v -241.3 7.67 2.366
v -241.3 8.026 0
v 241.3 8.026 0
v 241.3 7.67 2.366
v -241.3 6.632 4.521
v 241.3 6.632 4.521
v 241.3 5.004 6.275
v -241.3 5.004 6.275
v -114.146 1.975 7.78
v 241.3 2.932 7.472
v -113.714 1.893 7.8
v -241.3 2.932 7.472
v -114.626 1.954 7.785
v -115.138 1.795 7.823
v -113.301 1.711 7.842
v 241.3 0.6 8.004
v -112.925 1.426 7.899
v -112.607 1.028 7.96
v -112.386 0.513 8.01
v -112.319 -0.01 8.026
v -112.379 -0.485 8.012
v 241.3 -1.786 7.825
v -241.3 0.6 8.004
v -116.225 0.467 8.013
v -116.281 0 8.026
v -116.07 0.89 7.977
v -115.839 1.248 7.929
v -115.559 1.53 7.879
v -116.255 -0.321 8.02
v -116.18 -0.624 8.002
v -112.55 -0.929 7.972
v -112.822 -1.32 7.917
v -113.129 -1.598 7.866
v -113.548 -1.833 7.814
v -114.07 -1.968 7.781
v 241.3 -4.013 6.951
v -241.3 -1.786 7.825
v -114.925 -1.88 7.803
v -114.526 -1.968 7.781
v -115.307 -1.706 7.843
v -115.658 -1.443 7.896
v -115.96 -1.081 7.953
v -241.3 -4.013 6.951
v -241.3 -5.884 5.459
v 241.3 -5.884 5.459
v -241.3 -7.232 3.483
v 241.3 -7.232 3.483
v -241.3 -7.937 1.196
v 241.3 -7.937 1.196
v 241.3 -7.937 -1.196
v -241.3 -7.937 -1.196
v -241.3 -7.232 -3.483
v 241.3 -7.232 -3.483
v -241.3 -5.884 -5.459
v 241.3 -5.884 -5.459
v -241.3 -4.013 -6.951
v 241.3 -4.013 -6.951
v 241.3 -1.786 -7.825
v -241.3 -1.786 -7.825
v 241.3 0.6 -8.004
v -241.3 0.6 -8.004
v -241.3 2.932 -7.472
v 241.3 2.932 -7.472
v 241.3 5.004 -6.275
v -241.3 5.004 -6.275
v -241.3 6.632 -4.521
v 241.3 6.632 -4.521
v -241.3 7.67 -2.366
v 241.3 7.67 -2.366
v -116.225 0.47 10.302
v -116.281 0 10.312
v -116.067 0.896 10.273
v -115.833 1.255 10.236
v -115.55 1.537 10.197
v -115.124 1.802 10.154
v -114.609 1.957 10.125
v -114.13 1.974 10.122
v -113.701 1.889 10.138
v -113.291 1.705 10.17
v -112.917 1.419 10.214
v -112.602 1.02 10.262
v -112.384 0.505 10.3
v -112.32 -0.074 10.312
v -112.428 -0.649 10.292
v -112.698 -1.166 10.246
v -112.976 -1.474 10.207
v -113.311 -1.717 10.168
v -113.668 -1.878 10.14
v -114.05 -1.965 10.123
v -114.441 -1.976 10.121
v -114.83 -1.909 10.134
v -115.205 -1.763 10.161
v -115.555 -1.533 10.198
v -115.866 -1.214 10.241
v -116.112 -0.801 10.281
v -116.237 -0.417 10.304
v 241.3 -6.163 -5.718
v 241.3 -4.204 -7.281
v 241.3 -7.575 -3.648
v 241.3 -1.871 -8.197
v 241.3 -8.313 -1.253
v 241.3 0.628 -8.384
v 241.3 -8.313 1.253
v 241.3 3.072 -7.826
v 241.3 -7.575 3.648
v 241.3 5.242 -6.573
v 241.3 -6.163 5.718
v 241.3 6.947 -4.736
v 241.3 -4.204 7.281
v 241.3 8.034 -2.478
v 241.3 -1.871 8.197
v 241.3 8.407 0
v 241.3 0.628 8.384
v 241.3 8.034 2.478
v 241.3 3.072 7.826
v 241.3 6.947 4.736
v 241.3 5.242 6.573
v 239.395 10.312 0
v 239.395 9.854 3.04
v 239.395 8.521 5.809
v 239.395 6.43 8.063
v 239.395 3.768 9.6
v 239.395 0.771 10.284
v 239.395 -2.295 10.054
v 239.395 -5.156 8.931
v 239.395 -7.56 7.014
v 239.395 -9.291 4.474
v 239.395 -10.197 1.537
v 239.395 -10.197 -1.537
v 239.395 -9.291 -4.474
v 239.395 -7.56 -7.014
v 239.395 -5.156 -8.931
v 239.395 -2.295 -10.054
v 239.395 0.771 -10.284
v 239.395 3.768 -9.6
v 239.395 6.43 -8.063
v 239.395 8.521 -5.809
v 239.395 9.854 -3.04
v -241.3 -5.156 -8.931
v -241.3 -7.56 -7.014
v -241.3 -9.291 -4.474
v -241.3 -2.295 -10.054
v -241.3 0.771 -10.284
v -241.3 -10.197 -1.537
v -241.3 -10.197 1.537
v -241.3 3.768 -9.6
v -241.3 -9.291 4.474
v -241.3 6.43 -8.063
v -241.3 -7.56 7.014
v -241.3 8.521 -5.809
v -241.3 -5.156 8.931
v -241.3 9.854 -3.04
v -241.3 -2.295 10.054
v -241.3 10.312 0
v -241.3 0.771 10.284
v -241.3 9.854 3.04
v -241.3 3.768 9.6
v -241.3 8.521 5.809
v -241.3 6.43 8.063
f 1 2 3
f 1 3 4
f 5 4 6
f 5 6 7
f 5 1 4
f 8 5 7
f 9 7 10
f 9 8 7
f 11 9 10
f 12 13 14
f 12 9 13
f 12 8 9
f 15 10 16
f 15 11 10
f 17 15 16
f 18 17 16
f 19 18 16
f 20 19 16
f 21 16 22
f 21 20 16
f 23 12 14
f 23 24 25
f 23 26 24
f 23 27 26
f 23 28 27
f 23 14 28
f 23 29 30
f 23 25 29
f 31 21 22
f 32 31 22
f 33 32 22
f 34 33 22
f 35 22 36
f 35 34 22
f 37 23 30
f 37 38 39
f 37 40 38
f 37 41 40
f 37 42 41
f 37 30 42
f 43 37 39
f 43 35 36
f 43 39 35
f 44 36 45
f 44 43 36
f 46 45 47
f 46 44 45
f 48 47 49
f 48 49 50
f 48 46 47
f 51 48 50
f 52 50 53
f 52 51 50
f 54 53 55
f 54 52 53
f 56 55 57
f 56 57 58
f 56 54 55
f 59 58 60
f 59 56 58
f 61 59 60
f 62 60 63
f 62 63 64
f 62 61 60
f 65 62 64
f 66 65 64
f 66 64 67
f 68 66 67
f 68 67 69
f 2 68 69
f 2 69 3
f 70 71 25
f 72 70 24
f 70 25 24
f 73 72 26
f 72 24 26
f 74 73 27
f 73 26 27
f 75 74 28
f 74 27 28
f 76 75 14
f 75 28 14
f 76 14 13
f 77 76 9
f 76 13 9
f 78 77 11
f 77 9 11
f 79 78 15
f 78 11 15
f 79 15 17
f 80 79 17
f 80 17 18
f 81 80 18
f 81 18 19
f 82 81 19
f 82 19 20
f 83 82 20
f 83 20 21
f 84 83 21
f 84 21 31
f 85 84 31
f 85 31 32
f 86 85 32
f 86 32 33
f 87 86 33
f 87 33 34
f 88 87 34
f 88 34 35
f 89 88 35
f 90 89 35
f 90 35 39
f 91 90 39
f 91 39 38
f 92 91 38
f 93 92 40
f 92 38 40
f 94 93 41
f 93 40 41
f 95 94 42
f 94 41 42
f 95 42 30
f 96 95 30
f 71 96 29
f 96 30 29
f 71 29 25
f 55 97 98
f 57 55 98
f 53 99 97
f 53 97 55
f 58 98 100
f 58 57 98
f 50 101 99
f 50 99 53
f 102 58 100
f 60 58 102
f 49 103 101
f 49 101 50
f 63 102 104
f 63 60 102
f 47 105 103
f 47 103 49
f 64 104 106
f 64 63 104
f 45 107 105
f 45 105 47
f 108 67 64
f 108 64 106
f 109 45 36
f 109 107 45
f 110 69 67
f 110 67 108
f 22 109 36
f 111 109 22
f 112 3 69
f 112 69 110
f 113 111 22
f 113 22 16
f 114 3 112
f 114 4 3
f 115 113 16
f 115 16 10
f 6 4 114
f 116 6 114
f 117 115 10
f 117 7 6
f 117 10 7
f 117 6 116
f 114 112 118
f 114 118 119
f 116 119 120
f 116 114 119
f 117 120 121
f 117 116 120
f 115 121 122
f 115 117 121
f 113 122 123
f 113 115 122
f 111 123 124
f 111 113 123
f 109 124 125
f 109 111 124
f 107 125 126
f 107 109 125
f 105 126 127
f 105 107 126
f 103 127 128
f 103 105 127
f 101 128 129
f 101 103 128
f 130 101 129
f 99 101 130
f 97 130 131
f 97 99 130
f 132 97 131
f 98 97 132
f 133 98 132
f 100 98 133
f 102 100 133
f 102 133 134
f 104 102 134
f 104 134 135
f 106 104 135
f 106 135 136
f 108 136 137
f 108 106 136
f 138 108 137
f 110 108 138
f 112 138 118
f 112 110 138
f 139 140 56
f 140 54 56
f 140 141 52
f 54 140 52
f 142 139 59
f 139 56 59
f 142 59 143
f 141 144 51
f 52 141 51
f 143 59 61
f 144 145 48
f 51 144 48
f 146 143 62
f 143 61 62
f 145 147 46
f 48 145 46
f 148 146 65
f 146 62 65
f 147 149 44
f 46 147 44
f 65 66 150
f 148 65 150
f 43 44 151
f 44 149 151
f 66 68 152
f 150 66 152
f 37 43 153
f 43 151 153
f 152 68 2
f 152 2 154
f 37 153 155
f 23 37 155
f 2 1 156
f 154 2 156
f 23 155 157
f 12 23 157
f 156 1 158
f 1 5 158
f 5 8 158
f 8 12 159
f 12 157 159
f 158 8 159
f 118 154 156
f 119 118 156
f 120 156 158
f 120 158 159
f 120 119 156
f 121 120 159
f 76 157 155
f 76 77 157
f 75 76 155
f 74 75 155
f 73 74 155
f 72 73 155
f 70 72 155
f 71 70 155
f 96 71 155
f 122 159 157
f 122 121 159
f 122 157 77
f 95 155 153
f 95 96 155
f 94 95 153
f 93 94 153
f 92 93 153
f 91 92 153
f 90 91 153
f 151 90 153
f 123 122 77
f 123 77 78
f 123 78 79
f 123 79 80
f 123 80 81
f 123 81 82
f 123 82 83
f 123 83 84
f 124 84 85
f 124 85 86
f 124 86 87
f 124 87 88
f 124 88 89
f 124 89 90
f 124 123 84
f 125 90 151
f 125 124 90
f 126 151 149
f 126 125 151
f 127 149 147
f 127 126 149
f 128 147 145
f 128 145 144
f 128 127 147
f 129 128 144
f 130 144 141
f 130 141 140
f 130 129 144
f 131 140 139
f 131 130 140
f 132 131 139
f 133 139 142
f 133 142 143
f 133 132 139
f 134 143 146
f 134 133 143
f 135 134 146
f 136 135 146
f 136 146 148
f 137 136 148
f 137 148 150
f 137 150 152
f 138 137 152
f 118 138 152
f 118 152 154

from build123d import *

# Parameters (mm, degrees)
F1_R     = 10.3124
F1_R_2   = 8.0264
F2_DEPTH = 241.3
F4_D     = 3.9624
F4_DEPTH = 12.7
F4_START = 0.1921017
F4_TIP   = 1.1904250584
F5_SIZE  = 1.905


with BuildPart() as f2:
    # F1 (on Right) → F2 (new body, symmetric)
    with BuildSketch(Plane.YZ):
        Circle(F1_R)
        Circle(F1_R_2, mode=Mode.SUBTRACT)
    extrude(amount=F2_DEPTH, both=True)

    # F4
    # its depths count from where the whole tool has entered the part; down to there all is cleared
    with Locations(Plane.XY.offset(10.3124).offset(-F4_START)):
        with Locations((-114.3, 0)):
            Hole(F4_D / 2, depth=F4_DEPTH)
            with Locations((0, 0, -(F4_DEPTH + F4_TIP / 2))):  # 118° drill point
                Cone(0, F4_D / 2, F4_TIP, mode=Mode.SUBTRACT)

    # F5
    f5_edges = [f2.edges().sort_by_distance(p)[0] for p in [
        (241.3, -10.3124, 0),
    ]]
    chamfer(f5_edges, length=F5_SIZE)


solid = f2.part
